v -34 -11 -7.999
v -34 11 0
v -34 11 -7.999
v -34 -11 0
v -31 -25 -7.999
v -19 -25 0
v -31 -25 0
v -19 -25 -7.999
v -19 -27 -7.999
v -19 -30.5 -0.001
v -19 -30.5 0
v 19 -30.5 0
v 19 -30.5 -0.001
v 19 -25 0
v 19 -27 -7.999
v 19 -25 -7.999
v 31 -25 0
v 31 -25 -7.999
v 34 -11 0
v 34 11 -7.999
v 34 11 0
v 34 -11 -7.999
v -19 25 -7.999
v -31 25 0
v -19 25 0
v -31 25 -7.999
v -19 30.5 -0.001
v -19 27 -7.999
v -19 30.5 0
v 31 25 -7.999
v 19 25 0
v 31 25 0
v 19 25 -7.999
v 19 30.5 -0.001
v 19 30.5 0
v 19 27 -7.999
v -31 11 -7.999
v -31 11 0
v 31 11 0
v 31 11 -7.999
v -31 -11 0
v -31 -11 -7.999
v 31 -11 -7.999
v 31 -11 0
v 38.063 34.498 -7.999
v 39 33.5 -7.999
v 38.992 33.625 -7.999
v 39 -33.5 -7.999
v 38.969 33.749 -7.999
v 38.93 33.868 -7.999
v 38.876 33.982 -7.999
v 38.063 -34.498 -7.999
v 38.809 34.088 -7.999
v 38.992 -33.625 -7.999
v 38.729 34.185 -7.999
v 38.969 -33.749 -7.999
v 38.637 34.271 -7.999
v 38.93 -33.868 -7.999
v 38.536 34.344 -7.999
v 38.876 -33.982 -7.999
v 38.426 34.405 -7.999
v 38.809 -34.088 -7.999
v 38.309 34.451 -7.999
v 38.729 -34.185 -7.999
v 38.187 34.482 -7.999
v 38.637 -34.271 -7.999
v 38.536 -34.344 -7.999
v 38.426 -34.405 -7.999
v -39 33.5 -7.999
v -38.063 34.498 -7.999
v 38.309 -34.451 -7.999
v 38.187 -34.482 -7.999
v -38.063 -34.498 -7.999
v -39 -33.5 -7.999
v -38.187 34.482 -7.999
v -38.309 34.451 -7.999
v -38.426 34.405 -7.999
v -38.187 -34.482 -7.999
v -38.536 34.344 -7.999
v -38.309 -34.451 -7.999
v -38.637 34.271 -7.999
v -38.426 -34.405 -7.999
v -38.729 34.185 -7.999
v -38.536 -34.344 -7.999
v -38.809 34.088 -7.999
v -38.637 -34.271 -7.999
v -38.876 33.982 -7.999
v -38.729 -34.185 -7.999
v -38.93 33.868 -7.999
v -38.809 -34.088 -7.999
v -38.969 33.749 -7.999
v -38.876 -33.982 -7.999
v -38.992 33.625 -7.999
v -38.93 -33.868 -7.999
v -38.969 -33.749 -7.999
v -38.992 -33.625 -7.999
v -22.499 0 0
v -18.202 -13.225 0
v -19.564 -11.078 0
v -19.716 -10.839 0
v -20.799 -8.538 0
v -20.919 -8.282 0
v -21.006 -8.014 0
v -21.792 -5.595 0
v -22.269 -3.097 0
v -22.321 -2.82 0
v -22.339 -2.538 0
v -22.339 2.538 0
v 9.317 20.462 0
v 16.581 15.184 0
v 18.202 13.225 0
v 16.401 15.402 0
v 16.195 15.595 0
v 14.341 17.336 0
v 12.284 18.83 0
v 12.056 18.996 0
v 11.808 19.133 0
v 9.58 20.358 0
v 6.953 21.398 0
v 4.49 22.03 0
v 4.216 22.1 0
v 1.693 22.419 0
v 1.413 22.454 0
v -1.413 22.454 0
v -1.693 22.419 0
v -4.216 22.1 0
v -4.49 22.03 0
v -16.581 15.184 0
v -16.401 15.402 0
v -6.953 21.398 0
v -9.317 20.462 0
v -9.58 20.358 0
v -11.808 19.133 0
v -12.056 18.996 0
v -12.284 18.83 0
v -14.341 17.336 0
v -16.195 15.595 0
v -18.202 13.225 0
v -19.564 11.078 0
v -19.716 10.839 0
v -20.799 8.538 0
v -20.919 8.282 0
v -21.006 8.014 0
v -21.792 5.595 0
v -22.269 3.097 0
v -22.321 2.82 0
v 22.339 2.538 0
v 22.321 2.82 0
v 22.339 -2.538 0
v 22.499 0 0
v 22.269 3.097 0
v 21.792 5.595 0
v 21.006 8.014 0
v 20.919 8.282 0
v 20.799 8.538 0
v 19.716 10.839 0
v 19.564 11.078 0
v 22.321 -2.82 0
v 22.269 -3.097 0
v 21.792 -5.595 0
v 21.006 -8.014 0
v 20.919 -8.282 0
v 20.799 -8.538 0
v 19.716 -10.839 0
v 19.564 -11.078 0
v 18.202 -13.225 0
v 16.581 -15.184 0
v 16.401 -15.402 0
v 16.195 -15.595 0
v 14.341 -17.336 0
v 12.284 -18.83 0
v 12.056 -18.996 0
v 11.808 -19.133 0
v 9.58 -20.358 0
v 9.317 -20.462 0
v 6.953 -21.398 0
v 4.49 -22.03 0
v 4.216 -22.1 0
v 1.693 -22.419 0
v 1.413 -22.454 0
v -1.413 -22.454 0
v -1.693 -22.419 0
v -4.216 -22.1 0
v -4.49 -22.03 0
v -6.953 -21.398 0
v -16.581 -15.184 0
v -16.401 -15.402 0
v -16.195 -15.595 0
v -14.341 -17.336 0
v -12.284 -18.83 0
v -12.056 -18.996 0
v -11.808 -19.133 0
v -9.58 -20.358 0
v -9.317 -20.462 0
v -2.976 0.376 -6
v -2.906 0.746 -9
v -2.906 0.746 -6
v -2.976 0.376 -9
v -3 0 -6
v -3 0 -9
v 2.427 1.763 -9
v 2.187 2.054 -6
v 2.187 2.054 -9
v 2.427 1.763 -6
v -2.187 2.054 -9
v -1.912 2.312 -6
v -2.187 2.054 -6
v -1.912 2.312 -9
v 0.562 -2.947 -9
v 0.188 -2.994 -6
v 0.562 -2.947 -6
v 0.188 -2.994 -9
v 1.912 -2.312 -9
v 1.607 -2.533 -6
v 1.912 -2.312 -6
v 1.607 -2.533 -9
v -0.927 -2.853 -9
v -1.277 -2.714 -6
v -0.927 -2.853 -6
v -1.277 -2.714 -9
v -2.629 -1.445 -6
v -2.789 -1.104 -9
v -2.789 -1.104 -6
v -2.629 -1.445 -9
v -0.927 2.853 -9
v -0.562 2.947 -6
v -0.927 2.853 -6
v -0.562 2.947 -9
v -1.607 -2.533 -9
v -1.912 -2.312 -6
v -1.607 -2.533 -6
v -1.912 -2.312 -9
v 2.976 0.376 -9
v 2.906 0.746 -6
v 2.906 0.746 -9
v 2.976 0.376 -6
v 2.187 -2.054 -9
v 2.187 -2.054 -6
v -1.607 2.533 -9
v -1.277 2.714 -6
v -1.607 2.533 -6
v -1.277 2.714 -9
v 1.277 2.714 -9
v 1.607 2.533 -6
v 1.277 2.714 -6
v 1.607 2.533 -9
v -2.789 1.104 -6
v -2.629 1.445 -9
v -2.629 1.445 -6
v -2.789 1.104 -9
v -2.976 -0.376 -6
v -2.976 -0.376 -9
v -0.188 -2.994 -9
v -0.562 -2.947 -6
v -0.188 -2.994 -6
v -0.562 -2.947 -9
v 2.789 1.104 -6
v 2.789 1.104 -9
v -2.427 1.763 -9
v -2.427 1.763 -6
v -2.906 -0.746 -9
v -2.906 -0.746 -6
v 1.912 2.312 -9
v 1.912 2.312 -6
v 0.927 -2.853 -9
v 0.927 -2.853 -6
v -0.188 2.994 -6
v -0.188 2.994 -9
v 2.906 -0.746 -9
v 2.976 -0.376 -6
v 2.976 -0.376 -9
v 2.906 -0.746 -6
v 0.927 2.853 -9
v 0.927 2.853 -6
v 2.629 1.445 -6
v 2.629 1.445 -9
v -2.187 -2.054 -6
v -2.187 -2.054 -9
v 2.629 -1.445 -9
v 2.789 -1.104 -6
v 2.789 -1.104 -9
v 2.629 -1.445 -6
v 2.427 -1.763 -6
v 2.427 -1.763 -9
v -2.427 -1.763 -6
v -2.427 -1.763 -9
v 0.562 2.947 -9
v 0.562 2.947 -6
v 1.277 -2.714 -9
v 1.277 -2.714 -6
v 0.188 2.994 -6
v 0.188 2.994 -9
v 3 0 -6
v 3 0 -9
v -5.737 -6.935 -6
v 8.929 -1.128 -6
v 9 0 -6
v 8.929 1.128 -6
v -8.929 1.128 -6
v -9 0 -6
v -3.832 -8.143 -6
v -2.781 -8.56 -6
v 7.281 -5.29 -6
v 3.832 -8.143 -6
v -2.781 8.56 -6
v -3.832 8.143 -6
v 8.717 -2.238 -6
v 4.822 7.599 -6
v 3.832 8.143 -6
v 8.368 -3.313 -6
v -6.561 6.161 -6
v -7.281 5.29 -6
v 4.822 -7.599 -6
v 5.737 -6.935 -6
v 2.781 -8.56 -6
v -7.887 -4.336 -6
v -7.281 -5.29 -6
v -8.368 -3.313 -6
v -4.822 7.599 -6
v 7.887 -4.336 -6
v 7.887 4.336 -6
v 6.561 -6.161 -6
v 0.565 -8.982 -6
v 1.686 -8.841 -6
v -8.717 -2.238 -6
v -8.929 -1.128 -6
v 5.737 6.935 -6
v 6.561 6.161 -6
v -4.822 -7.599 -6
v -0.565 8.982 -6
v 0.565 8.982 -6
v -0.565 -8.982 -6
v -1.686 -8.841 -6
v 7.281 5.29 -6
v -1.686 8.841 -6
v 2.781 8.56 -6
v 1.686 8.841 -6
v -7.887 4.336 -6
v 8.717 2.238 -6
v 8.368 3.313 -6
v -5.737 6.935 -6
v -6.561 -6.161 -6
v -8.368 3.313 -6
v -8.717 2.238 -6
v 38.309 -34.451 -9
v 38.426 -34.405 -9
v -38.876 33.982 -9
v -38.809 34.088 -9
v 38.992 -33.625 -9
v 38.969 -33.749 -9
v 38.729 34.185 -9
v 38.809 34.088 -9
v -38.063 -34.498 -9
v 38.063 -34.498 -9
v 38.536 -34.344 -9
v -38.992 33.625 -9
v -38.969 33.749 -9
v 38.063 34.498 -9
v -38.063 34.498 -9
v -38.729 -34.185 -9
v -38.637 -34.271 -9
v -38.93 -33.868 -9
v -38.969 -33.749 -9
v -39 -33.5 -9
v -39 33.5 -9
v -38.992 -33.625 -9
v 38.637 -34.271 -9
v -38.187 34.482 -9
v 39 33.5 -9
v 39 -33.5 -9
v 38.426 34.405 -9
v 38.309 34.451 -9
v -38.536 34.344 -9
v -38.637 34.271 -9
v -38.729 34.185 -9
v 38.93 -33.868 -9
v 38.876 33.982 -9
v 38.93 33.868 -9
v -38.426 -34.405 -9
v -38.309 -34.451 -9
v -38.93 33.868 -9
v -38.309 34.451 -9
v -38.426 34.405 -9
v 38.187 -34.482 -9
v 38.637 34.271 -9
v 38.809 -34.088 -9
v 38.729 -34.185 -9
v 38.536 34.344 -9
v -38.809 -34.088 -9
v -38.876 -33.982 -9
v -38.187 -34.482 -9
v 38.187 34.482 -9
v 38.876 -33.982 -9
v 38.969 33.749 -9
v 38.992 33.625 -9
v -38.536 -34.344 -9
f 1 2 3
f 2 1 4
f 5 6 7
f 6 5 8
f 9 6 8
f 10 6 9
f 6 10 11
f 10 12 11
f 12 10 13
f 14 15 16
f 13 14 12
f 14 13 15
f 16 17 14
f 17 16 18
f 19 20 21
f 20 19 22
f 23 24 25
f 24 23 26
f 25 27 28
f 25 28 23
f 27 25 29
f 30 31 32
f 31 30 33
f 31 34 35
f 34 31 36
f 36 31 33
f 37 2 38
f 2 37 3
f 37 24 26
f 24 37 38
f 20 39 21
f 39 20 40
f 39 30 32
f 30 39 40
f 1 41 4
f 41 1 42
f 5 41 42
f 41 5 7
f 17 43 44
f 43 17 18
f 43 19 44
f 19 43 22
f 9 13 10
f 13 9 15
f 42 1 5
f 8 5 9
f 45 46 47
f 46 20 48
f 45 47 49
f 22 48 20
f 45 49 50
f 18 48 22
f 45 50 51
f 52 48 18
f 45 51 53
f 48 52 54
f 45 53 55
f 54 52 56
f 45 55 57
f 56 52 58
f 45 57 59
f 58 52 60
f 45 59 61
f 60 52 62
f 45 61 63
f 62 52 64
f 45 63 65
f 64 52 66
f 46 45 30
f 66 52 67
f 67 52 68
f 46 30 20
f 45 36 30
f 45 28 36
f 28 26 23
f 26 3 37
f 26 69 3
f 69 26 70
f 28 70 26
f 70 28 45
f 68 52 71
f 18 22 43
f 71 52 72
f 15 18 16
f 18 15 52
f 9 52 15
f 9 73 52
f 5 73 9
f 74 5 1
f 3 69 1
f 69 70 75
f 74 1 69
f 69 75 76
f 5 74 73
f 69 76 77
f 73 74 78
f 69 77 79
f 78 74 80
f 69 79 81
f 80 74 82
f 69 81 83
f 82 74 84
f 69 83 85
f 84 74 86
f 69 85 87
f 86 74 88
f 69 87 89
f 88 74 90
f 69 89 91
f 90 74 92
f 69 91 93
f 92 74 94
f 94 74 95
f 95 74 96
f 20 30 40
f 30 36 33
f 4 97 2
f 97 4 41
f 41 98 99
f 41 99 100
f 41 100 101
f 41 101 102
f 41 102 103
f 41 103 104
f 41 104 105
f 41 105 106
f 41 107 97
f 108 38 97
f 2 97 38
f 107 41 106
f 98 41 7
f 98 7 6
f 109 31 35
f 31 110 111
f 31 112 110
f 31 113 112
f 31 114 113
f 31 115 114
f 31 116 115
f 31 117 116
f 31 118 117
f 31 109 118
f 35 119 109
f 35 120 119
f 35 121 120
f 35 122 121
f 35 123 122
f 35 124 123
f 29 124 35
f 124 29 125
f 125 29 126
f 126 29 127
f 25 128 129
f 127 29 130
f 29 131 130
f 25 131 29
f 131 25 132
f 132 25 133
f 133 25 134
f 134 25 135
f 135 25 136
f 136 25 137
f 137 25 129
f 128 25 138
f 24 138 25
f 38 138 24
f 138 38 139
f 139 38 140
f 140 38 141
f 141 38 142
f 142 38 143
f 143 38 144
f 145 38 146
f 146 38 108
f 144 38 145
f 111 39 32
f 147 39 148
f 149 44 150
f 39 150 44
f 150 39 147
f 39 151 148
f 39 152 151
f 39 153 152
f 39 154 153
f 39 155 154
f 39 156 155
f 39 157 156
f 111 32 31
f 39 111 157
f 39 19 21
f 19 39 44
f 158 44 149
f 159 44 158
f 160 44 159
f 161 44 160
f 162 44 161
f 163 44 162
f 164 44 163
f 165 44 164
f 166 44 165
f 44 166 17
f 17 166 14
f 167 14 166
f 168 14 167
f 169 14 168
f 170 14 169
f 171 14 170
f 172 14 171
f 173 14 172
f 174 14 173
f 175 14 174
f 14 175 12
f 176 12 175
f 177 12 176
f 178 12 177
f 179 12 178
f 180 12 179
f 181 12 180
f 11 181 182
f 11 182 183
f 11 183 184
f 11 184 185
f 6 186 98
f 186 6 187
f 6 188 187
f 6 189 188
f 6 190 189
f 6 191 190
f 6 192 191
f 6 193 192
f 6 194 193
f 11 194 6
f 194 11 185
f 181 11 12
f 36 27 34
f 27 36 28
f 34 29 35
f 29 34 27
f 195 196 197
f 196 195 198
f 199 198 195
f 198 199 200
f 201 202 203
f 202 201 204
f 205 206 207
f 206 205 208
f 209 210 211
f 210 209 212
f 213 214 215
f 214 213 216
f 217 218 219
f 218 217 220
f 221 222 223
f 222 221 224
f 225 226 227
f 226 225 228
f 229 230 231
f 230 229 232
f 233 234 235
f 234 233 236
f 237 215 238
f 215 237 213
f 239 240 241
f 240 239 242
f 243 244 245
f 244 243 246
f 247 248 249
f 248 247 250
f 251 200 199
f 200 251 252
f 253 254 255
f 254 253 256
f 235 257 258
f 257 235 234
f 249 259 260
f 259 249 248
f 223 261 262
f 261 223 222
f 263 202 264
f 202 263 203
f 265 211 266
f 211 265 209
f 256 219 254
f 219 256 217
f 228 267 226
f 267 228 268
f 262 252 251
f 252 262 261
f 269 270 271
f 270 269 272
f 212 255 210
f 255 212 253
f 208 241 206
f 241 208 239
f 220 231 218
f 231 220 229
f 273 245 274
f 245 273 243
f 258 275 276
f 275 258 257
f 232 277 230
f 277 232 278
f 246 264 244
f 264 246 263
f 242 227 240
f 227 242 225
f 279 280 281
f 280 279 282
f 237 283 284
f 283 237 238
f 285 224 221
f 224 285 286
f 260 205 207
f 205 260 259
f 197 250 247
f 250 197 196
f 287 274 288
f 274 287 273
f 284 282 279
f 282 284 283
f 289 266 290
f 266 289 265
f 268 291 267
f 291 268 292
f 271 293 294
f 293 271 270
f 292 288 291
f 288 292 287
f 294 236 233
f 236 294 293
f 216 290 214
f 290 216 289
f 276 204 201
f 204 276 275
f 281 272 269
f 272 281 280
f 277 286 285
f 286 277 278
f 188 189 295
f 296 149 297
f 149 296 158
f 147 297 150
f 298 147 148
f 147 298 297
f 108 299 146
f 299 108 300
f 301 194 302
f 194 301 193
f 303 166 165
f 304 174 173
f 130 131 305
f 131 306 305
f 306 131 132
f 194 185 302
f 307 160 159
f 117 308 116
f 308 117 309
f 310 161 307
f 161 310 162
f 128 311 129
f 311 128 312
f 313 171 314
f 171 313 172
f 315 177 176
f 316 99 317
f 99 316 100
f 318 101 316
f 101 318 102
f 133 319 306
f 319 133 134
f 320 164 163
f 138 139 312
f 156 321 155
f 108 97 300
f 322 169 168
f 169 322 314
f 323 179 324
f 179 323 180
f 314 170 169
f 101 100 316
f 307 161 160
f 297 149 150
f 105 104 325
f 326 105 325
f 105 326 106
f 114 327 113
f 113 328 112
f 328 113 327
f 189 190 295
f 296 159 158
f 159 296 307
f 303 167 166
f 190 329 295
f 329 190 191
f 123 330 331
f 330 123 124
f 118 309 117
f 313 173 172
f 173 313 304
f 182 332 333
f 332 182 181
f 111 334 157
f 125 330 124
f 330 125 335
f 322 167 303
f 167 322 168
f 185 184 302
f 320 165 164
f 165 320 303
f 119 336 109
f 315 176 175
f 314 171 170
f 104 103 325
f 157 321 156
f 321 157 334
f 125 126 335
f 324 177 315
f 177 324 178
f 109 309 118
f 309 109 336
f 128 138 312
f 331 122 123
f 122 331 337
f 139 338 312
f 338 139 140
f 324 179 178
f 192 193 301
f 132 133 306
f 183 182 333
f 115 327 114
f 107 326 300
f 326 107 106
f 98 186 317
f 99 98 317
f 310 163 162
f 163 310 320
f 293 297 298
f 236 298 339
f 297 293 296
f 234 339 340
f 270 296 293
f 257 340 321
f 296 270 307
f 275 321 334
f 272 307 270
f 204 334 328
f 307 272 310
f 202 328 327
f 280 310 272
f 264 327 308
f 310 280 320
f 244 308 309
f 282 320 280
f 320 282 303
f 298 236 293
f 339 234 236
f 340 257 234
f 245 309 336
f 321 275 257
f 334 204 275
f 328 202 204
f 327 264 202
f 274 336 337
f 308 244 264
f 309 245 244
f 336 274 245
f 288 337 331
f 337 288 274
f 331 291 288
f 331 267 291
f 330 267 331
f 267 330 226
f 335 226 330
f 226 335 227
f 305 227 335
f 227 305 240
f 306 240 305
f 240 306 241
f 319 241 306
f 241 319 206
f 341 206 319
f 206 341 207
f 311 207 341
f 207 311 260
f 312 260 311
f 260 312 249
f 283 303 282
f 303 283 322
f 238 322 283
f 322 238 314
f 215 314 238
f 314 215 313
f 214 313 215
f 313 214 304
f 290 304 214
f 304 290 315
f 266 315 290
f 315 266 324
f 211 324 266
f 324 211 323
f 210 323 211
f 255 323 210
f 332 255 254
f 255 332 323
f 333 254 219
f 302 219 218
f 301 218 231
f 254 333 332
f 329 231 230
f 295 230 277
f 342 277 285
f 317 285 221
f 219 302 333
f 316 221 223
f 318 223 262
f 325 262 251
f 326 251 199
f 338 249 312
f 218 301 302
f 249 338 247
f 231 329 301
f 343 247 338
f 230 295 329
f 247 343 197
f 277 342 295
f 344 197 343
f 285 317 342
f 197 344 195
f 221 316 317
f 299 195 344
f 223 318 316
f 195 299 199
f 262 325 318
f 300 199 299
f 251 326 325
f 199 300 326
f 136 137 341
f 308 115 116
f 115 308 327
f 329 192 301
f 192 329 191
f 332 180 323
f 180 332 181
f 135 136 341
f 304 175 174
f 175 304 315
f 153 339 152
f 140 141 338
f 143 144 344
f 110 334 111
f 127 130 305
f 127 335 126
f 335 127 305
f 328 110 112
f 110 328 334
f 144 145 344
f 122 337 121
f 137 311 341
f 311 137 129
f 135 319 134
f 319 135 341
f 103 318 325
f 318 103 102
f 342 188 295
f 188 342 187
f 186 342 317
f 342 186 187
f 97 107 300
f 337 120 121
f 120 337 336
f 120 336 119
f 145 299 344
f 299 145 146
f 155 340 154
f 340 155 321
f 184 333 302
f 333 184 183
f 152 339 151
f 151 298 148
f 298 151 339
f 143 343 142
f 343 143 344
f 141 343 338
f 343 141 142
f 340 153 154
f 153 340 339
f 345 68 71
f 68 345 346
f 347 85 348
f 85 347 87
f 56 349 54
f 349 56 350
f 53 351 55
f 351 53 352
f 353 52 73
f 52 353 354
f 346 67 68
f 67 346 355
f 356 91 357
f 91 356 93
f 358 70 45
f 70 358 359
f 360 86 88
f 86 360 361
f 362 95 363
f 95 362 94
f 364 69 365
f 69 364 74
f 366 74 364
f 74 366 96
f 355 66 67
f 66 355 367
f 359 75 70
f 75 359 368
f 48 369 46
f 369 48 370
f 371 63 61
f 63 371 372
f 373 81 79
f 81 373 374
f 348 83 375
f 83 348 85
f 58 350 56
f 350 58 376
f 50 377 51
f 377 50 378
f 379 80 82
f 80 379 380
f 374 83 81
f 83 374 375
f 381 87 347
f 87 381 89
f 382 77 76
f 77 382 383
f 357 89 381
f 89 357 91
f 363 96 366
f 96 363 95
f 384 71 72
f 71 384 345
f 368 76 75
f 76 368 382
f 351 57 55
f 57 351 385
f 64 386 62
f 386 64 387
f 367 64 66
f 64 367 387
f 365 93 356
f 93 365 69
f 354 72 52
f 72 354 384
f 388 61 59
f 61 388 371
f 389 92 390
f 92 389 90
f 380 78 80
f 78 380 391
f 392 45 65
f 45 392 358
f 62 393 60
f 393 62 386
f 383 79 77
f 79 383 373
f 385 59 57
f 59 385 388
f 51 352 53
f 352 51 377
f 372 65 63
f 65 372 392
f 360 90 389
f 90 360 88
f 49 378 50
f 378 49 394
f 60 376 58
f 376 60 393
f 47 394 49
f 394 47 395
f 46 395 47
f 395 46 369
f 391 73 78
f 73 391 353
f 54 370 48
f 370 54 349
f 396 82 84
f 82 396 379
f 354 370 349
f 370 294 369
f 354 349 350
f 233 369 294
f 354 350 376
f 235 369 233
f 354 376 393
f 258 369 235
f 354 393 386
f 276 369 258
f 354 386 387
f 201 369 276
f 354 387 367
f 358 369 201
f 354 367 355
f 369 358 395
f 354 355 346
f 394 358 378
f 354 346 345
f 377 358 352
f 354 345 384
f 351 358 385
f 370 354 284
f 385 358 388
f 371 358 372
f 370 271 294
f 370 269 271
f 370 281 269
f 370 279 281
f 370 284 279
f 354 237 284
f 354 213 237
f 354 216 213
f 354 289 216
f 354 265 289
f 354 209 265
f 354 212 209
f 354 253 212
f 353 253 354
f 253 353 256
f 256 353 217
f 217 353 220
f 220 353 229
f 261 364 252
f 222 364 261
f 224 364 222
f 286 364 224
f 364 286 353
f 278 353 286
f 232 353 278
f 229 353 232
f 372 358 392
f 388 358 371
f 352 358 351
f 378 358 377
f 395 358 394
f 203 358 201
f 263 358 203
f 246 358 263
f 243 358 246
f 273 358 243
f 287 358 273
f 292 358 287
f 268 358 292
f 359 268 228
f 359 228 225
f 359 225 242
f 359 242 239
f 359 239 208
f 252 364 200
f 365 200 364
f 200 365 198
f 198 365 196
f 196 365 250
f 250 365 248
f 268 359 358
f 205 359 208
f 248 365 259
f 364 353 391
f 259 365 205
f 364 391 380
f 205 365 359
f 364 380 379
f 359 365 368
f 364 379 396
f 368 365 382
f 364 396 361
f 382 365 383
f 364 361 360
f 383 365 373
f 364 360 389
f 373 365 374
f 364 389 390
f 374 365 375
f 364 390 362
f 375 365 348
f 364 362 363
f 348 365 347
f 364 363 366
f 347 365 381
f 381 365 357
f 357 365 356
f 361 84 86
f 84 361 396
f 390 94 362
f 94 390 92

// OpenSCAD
// [FL_INDEX: keywords="openscad, 3d_parametric, Rectangular-ish_Quick_Release_Tripod_mount, csg_solid" | COT="Parametric OpenSCAD design from 3DCodeverse"]
// Title: Rectangular-ish Quick Release Tripod mount



//How wide the clip part is flat side to flat side
ShoeBottomWidth = 68;
// The widest part of the angle
ShoeBottomLength = 61; 
//How wide the clip part is flat side to flat side
ShoeTopWidth = 68;
// The narrowest part of the angle
ShoeTopLength = 54; 
// How tall the shoe part is
ShoeDepth = 8;

// How long any 'keying' is on the front/back face of the shoe
FrontDetentLength = 15;
// How wide any 'keying' is on the front/back face of the shoe
FrontDetentWidth = 2;

// How long any 'keying' is on the side of the shoe
SideDetentLength = 16;
// How wide any 'keying' is on the side of the shoe
SideDetentWidth = 3;

TopPlateWidth = 78;
TopPlateLength = 69;
TopPlateDepth = 1;

$fn=50 + 0;

rotate(a=[0,180,0])
{
	difference()
	{
		shoe();
		shoekeys();
		cylinder(h = ShoeDepth, r=3);
		rotate(a=[0,180,0]) translate([0,0,2-ShoeDepth]) cylinder(h = ShoeDepth, r1 = 9, r2 = min(ShoeBottomWidth, ShoeBottomLength, ShoeTopWidth, ShoeTopLength) * .5);
	
	}
	
	// Face Plate
	difference()
	{
		minkowski()
		{
			translate([0,0, ShoeDepth]) cube(size = [TopPlateWidth - TopPlateDepth- TopPlateDepth,TopPlateLength - TopPlateDepth - TopPlateDepth,.001], center = true);
		 	cylinder(r=TopPlateDepth,h=TopPlateDepth);
		}
		translate([0,0, TopPlateDepth * 2]) cylinder(h = ShoeDepth, r=3);
	}
}



module shoe() {
	hull() {
		translate([0,0, .001]) cube(size = [ShoeBottomWidth,ShoeBottomLength,.001], center = true);
 		translate([0,0,ShoeDepth-.001]) cube(size = [ShoeTopWidth,ShoeTopLength,.001], center = true);
	}
}

module shoekeys()
{

	//Front and back keys
	hull()
	{	
		translate([(ShoeTopWidth * .5) - FrontDetentLength, (ShoeTopLength * .5) - ShoeTopLength, 0]) cube(size = [FrontDetentLength,FrontDetentWidth,ShoeDepth], center = false);
		translate([(ShoeBottomWidth * .5) - FrontDetentLength, -(ShoeBottomLength * .5) , 0]) cube(size = [FrontDetentLength,FrontDetentWidth,ShoeDepth], center = false);
	}
	hull()
	{	
		translate([-(ShoeTopWidth * .5) , (ShoeTopLength * .5) - ShoeTopLength, 0]) cube(size = [FrontDetentLength,FrontDetentWidth,ShoeDepth], center = false);
		translate([-(ShoeBottomWidth * .5) , -(ShoeBottomLength * .5) , 0]) cube(size = [FrontDetentLength,FrontDetentWidth,ShoeDepth], center = false);
	}

	hull()
	{	
		translate([(ShoeTopWidth * .5) - FrontDetentLength, (ShoeTopLength * .5) -FrontDetentWidth, 0]) cube(size = [FrontDetentLength,FrontDetentWidth,ShoeDepth], center = false);
		translate([(ShoeBottomWidth * .5) - FrontDetentLength, (ShoeBottomLength * .5) , 0]) cube(size = [FrontDetentLength,FrontDetentWidth,ShoeDepth], center = false);
	}
	hull()
	{	
		translate([-(ShoeTopWidth * .5) , (ShoeTopLength * .5) -FrontDetentWidth, 0]) cube(size = [FrontDetentLength,FrontDetentWidth,ShoeDepth], center = false);
		translate([-(ShoeBottomWidth * .5) , (ShoeBottomLength * .5) , 0]) cube(size = [FrontDetentLength,FrontDetentWidth,ShoeDepth], center = false);
	}

	// Side Keys
	hull()
	{
		translate([(ShoeTopWidth * .5) - SideDetentWidth , (ShoeTopLength * .5) - SideDetentLength, 0]) cube(size = [SideDetentWidth,SideDetentLength,ShoeDepth], center = false);
		translate([(ShoeBottomWidth * .5) - SideDetentWidth , (ShoeBottomLength * .5) - SideDetentLength, 0]) cube(size = [SideDetentWidth,SideDetentLength,ShoeDepth], center = false);
	}
	hull()
	{
	translate([-(ShoeTopWidth * .5)  , (ShoeTopLength * .5) - SideDetentLength, 0]) cube(size = [SideDetentWidth,SideDetentLength,ShoeDepth], center = false);
		translate([-(ShoeBottomWidth * .5)  , (ShoeBottomLength * .5) - SideDetentLength, 0]) cube(size = [SideDetentWidth,SideDetentLength,ShoeDepth], center = false);
	}
	hull()
	{
		translate([(ShoeTopWidth * .5) - SideDetentWidth , -(ShoeTopLength * .5), 0]) cube(size = [SideDetentWidth,SideDetentLength,ShoeDepth], center = false);
		translate([(ShoeBottomWidth * .5) - SideDetentWidth , -(ShoeBottomLength * .5), 0]) cube(size = [SideDetentWidth,SideDetentLength,ShoeDepth], center = false);
	}
	hull()
	{
	translate([-(ShoeTopWidth * .5)  , -(ShoeTopLength * .5) , 0]) cube(size = [SideDetentWidth,SideDetentLength,ShoeDepth], center = false);
		translate([-(ShoeBottomWidth * .5)  , -(ShoeBottomLength * .5) , 0]) cube(size = [SideDetentWidth,SideDetentLength,ShoeDepth], center = false);
	}
}
